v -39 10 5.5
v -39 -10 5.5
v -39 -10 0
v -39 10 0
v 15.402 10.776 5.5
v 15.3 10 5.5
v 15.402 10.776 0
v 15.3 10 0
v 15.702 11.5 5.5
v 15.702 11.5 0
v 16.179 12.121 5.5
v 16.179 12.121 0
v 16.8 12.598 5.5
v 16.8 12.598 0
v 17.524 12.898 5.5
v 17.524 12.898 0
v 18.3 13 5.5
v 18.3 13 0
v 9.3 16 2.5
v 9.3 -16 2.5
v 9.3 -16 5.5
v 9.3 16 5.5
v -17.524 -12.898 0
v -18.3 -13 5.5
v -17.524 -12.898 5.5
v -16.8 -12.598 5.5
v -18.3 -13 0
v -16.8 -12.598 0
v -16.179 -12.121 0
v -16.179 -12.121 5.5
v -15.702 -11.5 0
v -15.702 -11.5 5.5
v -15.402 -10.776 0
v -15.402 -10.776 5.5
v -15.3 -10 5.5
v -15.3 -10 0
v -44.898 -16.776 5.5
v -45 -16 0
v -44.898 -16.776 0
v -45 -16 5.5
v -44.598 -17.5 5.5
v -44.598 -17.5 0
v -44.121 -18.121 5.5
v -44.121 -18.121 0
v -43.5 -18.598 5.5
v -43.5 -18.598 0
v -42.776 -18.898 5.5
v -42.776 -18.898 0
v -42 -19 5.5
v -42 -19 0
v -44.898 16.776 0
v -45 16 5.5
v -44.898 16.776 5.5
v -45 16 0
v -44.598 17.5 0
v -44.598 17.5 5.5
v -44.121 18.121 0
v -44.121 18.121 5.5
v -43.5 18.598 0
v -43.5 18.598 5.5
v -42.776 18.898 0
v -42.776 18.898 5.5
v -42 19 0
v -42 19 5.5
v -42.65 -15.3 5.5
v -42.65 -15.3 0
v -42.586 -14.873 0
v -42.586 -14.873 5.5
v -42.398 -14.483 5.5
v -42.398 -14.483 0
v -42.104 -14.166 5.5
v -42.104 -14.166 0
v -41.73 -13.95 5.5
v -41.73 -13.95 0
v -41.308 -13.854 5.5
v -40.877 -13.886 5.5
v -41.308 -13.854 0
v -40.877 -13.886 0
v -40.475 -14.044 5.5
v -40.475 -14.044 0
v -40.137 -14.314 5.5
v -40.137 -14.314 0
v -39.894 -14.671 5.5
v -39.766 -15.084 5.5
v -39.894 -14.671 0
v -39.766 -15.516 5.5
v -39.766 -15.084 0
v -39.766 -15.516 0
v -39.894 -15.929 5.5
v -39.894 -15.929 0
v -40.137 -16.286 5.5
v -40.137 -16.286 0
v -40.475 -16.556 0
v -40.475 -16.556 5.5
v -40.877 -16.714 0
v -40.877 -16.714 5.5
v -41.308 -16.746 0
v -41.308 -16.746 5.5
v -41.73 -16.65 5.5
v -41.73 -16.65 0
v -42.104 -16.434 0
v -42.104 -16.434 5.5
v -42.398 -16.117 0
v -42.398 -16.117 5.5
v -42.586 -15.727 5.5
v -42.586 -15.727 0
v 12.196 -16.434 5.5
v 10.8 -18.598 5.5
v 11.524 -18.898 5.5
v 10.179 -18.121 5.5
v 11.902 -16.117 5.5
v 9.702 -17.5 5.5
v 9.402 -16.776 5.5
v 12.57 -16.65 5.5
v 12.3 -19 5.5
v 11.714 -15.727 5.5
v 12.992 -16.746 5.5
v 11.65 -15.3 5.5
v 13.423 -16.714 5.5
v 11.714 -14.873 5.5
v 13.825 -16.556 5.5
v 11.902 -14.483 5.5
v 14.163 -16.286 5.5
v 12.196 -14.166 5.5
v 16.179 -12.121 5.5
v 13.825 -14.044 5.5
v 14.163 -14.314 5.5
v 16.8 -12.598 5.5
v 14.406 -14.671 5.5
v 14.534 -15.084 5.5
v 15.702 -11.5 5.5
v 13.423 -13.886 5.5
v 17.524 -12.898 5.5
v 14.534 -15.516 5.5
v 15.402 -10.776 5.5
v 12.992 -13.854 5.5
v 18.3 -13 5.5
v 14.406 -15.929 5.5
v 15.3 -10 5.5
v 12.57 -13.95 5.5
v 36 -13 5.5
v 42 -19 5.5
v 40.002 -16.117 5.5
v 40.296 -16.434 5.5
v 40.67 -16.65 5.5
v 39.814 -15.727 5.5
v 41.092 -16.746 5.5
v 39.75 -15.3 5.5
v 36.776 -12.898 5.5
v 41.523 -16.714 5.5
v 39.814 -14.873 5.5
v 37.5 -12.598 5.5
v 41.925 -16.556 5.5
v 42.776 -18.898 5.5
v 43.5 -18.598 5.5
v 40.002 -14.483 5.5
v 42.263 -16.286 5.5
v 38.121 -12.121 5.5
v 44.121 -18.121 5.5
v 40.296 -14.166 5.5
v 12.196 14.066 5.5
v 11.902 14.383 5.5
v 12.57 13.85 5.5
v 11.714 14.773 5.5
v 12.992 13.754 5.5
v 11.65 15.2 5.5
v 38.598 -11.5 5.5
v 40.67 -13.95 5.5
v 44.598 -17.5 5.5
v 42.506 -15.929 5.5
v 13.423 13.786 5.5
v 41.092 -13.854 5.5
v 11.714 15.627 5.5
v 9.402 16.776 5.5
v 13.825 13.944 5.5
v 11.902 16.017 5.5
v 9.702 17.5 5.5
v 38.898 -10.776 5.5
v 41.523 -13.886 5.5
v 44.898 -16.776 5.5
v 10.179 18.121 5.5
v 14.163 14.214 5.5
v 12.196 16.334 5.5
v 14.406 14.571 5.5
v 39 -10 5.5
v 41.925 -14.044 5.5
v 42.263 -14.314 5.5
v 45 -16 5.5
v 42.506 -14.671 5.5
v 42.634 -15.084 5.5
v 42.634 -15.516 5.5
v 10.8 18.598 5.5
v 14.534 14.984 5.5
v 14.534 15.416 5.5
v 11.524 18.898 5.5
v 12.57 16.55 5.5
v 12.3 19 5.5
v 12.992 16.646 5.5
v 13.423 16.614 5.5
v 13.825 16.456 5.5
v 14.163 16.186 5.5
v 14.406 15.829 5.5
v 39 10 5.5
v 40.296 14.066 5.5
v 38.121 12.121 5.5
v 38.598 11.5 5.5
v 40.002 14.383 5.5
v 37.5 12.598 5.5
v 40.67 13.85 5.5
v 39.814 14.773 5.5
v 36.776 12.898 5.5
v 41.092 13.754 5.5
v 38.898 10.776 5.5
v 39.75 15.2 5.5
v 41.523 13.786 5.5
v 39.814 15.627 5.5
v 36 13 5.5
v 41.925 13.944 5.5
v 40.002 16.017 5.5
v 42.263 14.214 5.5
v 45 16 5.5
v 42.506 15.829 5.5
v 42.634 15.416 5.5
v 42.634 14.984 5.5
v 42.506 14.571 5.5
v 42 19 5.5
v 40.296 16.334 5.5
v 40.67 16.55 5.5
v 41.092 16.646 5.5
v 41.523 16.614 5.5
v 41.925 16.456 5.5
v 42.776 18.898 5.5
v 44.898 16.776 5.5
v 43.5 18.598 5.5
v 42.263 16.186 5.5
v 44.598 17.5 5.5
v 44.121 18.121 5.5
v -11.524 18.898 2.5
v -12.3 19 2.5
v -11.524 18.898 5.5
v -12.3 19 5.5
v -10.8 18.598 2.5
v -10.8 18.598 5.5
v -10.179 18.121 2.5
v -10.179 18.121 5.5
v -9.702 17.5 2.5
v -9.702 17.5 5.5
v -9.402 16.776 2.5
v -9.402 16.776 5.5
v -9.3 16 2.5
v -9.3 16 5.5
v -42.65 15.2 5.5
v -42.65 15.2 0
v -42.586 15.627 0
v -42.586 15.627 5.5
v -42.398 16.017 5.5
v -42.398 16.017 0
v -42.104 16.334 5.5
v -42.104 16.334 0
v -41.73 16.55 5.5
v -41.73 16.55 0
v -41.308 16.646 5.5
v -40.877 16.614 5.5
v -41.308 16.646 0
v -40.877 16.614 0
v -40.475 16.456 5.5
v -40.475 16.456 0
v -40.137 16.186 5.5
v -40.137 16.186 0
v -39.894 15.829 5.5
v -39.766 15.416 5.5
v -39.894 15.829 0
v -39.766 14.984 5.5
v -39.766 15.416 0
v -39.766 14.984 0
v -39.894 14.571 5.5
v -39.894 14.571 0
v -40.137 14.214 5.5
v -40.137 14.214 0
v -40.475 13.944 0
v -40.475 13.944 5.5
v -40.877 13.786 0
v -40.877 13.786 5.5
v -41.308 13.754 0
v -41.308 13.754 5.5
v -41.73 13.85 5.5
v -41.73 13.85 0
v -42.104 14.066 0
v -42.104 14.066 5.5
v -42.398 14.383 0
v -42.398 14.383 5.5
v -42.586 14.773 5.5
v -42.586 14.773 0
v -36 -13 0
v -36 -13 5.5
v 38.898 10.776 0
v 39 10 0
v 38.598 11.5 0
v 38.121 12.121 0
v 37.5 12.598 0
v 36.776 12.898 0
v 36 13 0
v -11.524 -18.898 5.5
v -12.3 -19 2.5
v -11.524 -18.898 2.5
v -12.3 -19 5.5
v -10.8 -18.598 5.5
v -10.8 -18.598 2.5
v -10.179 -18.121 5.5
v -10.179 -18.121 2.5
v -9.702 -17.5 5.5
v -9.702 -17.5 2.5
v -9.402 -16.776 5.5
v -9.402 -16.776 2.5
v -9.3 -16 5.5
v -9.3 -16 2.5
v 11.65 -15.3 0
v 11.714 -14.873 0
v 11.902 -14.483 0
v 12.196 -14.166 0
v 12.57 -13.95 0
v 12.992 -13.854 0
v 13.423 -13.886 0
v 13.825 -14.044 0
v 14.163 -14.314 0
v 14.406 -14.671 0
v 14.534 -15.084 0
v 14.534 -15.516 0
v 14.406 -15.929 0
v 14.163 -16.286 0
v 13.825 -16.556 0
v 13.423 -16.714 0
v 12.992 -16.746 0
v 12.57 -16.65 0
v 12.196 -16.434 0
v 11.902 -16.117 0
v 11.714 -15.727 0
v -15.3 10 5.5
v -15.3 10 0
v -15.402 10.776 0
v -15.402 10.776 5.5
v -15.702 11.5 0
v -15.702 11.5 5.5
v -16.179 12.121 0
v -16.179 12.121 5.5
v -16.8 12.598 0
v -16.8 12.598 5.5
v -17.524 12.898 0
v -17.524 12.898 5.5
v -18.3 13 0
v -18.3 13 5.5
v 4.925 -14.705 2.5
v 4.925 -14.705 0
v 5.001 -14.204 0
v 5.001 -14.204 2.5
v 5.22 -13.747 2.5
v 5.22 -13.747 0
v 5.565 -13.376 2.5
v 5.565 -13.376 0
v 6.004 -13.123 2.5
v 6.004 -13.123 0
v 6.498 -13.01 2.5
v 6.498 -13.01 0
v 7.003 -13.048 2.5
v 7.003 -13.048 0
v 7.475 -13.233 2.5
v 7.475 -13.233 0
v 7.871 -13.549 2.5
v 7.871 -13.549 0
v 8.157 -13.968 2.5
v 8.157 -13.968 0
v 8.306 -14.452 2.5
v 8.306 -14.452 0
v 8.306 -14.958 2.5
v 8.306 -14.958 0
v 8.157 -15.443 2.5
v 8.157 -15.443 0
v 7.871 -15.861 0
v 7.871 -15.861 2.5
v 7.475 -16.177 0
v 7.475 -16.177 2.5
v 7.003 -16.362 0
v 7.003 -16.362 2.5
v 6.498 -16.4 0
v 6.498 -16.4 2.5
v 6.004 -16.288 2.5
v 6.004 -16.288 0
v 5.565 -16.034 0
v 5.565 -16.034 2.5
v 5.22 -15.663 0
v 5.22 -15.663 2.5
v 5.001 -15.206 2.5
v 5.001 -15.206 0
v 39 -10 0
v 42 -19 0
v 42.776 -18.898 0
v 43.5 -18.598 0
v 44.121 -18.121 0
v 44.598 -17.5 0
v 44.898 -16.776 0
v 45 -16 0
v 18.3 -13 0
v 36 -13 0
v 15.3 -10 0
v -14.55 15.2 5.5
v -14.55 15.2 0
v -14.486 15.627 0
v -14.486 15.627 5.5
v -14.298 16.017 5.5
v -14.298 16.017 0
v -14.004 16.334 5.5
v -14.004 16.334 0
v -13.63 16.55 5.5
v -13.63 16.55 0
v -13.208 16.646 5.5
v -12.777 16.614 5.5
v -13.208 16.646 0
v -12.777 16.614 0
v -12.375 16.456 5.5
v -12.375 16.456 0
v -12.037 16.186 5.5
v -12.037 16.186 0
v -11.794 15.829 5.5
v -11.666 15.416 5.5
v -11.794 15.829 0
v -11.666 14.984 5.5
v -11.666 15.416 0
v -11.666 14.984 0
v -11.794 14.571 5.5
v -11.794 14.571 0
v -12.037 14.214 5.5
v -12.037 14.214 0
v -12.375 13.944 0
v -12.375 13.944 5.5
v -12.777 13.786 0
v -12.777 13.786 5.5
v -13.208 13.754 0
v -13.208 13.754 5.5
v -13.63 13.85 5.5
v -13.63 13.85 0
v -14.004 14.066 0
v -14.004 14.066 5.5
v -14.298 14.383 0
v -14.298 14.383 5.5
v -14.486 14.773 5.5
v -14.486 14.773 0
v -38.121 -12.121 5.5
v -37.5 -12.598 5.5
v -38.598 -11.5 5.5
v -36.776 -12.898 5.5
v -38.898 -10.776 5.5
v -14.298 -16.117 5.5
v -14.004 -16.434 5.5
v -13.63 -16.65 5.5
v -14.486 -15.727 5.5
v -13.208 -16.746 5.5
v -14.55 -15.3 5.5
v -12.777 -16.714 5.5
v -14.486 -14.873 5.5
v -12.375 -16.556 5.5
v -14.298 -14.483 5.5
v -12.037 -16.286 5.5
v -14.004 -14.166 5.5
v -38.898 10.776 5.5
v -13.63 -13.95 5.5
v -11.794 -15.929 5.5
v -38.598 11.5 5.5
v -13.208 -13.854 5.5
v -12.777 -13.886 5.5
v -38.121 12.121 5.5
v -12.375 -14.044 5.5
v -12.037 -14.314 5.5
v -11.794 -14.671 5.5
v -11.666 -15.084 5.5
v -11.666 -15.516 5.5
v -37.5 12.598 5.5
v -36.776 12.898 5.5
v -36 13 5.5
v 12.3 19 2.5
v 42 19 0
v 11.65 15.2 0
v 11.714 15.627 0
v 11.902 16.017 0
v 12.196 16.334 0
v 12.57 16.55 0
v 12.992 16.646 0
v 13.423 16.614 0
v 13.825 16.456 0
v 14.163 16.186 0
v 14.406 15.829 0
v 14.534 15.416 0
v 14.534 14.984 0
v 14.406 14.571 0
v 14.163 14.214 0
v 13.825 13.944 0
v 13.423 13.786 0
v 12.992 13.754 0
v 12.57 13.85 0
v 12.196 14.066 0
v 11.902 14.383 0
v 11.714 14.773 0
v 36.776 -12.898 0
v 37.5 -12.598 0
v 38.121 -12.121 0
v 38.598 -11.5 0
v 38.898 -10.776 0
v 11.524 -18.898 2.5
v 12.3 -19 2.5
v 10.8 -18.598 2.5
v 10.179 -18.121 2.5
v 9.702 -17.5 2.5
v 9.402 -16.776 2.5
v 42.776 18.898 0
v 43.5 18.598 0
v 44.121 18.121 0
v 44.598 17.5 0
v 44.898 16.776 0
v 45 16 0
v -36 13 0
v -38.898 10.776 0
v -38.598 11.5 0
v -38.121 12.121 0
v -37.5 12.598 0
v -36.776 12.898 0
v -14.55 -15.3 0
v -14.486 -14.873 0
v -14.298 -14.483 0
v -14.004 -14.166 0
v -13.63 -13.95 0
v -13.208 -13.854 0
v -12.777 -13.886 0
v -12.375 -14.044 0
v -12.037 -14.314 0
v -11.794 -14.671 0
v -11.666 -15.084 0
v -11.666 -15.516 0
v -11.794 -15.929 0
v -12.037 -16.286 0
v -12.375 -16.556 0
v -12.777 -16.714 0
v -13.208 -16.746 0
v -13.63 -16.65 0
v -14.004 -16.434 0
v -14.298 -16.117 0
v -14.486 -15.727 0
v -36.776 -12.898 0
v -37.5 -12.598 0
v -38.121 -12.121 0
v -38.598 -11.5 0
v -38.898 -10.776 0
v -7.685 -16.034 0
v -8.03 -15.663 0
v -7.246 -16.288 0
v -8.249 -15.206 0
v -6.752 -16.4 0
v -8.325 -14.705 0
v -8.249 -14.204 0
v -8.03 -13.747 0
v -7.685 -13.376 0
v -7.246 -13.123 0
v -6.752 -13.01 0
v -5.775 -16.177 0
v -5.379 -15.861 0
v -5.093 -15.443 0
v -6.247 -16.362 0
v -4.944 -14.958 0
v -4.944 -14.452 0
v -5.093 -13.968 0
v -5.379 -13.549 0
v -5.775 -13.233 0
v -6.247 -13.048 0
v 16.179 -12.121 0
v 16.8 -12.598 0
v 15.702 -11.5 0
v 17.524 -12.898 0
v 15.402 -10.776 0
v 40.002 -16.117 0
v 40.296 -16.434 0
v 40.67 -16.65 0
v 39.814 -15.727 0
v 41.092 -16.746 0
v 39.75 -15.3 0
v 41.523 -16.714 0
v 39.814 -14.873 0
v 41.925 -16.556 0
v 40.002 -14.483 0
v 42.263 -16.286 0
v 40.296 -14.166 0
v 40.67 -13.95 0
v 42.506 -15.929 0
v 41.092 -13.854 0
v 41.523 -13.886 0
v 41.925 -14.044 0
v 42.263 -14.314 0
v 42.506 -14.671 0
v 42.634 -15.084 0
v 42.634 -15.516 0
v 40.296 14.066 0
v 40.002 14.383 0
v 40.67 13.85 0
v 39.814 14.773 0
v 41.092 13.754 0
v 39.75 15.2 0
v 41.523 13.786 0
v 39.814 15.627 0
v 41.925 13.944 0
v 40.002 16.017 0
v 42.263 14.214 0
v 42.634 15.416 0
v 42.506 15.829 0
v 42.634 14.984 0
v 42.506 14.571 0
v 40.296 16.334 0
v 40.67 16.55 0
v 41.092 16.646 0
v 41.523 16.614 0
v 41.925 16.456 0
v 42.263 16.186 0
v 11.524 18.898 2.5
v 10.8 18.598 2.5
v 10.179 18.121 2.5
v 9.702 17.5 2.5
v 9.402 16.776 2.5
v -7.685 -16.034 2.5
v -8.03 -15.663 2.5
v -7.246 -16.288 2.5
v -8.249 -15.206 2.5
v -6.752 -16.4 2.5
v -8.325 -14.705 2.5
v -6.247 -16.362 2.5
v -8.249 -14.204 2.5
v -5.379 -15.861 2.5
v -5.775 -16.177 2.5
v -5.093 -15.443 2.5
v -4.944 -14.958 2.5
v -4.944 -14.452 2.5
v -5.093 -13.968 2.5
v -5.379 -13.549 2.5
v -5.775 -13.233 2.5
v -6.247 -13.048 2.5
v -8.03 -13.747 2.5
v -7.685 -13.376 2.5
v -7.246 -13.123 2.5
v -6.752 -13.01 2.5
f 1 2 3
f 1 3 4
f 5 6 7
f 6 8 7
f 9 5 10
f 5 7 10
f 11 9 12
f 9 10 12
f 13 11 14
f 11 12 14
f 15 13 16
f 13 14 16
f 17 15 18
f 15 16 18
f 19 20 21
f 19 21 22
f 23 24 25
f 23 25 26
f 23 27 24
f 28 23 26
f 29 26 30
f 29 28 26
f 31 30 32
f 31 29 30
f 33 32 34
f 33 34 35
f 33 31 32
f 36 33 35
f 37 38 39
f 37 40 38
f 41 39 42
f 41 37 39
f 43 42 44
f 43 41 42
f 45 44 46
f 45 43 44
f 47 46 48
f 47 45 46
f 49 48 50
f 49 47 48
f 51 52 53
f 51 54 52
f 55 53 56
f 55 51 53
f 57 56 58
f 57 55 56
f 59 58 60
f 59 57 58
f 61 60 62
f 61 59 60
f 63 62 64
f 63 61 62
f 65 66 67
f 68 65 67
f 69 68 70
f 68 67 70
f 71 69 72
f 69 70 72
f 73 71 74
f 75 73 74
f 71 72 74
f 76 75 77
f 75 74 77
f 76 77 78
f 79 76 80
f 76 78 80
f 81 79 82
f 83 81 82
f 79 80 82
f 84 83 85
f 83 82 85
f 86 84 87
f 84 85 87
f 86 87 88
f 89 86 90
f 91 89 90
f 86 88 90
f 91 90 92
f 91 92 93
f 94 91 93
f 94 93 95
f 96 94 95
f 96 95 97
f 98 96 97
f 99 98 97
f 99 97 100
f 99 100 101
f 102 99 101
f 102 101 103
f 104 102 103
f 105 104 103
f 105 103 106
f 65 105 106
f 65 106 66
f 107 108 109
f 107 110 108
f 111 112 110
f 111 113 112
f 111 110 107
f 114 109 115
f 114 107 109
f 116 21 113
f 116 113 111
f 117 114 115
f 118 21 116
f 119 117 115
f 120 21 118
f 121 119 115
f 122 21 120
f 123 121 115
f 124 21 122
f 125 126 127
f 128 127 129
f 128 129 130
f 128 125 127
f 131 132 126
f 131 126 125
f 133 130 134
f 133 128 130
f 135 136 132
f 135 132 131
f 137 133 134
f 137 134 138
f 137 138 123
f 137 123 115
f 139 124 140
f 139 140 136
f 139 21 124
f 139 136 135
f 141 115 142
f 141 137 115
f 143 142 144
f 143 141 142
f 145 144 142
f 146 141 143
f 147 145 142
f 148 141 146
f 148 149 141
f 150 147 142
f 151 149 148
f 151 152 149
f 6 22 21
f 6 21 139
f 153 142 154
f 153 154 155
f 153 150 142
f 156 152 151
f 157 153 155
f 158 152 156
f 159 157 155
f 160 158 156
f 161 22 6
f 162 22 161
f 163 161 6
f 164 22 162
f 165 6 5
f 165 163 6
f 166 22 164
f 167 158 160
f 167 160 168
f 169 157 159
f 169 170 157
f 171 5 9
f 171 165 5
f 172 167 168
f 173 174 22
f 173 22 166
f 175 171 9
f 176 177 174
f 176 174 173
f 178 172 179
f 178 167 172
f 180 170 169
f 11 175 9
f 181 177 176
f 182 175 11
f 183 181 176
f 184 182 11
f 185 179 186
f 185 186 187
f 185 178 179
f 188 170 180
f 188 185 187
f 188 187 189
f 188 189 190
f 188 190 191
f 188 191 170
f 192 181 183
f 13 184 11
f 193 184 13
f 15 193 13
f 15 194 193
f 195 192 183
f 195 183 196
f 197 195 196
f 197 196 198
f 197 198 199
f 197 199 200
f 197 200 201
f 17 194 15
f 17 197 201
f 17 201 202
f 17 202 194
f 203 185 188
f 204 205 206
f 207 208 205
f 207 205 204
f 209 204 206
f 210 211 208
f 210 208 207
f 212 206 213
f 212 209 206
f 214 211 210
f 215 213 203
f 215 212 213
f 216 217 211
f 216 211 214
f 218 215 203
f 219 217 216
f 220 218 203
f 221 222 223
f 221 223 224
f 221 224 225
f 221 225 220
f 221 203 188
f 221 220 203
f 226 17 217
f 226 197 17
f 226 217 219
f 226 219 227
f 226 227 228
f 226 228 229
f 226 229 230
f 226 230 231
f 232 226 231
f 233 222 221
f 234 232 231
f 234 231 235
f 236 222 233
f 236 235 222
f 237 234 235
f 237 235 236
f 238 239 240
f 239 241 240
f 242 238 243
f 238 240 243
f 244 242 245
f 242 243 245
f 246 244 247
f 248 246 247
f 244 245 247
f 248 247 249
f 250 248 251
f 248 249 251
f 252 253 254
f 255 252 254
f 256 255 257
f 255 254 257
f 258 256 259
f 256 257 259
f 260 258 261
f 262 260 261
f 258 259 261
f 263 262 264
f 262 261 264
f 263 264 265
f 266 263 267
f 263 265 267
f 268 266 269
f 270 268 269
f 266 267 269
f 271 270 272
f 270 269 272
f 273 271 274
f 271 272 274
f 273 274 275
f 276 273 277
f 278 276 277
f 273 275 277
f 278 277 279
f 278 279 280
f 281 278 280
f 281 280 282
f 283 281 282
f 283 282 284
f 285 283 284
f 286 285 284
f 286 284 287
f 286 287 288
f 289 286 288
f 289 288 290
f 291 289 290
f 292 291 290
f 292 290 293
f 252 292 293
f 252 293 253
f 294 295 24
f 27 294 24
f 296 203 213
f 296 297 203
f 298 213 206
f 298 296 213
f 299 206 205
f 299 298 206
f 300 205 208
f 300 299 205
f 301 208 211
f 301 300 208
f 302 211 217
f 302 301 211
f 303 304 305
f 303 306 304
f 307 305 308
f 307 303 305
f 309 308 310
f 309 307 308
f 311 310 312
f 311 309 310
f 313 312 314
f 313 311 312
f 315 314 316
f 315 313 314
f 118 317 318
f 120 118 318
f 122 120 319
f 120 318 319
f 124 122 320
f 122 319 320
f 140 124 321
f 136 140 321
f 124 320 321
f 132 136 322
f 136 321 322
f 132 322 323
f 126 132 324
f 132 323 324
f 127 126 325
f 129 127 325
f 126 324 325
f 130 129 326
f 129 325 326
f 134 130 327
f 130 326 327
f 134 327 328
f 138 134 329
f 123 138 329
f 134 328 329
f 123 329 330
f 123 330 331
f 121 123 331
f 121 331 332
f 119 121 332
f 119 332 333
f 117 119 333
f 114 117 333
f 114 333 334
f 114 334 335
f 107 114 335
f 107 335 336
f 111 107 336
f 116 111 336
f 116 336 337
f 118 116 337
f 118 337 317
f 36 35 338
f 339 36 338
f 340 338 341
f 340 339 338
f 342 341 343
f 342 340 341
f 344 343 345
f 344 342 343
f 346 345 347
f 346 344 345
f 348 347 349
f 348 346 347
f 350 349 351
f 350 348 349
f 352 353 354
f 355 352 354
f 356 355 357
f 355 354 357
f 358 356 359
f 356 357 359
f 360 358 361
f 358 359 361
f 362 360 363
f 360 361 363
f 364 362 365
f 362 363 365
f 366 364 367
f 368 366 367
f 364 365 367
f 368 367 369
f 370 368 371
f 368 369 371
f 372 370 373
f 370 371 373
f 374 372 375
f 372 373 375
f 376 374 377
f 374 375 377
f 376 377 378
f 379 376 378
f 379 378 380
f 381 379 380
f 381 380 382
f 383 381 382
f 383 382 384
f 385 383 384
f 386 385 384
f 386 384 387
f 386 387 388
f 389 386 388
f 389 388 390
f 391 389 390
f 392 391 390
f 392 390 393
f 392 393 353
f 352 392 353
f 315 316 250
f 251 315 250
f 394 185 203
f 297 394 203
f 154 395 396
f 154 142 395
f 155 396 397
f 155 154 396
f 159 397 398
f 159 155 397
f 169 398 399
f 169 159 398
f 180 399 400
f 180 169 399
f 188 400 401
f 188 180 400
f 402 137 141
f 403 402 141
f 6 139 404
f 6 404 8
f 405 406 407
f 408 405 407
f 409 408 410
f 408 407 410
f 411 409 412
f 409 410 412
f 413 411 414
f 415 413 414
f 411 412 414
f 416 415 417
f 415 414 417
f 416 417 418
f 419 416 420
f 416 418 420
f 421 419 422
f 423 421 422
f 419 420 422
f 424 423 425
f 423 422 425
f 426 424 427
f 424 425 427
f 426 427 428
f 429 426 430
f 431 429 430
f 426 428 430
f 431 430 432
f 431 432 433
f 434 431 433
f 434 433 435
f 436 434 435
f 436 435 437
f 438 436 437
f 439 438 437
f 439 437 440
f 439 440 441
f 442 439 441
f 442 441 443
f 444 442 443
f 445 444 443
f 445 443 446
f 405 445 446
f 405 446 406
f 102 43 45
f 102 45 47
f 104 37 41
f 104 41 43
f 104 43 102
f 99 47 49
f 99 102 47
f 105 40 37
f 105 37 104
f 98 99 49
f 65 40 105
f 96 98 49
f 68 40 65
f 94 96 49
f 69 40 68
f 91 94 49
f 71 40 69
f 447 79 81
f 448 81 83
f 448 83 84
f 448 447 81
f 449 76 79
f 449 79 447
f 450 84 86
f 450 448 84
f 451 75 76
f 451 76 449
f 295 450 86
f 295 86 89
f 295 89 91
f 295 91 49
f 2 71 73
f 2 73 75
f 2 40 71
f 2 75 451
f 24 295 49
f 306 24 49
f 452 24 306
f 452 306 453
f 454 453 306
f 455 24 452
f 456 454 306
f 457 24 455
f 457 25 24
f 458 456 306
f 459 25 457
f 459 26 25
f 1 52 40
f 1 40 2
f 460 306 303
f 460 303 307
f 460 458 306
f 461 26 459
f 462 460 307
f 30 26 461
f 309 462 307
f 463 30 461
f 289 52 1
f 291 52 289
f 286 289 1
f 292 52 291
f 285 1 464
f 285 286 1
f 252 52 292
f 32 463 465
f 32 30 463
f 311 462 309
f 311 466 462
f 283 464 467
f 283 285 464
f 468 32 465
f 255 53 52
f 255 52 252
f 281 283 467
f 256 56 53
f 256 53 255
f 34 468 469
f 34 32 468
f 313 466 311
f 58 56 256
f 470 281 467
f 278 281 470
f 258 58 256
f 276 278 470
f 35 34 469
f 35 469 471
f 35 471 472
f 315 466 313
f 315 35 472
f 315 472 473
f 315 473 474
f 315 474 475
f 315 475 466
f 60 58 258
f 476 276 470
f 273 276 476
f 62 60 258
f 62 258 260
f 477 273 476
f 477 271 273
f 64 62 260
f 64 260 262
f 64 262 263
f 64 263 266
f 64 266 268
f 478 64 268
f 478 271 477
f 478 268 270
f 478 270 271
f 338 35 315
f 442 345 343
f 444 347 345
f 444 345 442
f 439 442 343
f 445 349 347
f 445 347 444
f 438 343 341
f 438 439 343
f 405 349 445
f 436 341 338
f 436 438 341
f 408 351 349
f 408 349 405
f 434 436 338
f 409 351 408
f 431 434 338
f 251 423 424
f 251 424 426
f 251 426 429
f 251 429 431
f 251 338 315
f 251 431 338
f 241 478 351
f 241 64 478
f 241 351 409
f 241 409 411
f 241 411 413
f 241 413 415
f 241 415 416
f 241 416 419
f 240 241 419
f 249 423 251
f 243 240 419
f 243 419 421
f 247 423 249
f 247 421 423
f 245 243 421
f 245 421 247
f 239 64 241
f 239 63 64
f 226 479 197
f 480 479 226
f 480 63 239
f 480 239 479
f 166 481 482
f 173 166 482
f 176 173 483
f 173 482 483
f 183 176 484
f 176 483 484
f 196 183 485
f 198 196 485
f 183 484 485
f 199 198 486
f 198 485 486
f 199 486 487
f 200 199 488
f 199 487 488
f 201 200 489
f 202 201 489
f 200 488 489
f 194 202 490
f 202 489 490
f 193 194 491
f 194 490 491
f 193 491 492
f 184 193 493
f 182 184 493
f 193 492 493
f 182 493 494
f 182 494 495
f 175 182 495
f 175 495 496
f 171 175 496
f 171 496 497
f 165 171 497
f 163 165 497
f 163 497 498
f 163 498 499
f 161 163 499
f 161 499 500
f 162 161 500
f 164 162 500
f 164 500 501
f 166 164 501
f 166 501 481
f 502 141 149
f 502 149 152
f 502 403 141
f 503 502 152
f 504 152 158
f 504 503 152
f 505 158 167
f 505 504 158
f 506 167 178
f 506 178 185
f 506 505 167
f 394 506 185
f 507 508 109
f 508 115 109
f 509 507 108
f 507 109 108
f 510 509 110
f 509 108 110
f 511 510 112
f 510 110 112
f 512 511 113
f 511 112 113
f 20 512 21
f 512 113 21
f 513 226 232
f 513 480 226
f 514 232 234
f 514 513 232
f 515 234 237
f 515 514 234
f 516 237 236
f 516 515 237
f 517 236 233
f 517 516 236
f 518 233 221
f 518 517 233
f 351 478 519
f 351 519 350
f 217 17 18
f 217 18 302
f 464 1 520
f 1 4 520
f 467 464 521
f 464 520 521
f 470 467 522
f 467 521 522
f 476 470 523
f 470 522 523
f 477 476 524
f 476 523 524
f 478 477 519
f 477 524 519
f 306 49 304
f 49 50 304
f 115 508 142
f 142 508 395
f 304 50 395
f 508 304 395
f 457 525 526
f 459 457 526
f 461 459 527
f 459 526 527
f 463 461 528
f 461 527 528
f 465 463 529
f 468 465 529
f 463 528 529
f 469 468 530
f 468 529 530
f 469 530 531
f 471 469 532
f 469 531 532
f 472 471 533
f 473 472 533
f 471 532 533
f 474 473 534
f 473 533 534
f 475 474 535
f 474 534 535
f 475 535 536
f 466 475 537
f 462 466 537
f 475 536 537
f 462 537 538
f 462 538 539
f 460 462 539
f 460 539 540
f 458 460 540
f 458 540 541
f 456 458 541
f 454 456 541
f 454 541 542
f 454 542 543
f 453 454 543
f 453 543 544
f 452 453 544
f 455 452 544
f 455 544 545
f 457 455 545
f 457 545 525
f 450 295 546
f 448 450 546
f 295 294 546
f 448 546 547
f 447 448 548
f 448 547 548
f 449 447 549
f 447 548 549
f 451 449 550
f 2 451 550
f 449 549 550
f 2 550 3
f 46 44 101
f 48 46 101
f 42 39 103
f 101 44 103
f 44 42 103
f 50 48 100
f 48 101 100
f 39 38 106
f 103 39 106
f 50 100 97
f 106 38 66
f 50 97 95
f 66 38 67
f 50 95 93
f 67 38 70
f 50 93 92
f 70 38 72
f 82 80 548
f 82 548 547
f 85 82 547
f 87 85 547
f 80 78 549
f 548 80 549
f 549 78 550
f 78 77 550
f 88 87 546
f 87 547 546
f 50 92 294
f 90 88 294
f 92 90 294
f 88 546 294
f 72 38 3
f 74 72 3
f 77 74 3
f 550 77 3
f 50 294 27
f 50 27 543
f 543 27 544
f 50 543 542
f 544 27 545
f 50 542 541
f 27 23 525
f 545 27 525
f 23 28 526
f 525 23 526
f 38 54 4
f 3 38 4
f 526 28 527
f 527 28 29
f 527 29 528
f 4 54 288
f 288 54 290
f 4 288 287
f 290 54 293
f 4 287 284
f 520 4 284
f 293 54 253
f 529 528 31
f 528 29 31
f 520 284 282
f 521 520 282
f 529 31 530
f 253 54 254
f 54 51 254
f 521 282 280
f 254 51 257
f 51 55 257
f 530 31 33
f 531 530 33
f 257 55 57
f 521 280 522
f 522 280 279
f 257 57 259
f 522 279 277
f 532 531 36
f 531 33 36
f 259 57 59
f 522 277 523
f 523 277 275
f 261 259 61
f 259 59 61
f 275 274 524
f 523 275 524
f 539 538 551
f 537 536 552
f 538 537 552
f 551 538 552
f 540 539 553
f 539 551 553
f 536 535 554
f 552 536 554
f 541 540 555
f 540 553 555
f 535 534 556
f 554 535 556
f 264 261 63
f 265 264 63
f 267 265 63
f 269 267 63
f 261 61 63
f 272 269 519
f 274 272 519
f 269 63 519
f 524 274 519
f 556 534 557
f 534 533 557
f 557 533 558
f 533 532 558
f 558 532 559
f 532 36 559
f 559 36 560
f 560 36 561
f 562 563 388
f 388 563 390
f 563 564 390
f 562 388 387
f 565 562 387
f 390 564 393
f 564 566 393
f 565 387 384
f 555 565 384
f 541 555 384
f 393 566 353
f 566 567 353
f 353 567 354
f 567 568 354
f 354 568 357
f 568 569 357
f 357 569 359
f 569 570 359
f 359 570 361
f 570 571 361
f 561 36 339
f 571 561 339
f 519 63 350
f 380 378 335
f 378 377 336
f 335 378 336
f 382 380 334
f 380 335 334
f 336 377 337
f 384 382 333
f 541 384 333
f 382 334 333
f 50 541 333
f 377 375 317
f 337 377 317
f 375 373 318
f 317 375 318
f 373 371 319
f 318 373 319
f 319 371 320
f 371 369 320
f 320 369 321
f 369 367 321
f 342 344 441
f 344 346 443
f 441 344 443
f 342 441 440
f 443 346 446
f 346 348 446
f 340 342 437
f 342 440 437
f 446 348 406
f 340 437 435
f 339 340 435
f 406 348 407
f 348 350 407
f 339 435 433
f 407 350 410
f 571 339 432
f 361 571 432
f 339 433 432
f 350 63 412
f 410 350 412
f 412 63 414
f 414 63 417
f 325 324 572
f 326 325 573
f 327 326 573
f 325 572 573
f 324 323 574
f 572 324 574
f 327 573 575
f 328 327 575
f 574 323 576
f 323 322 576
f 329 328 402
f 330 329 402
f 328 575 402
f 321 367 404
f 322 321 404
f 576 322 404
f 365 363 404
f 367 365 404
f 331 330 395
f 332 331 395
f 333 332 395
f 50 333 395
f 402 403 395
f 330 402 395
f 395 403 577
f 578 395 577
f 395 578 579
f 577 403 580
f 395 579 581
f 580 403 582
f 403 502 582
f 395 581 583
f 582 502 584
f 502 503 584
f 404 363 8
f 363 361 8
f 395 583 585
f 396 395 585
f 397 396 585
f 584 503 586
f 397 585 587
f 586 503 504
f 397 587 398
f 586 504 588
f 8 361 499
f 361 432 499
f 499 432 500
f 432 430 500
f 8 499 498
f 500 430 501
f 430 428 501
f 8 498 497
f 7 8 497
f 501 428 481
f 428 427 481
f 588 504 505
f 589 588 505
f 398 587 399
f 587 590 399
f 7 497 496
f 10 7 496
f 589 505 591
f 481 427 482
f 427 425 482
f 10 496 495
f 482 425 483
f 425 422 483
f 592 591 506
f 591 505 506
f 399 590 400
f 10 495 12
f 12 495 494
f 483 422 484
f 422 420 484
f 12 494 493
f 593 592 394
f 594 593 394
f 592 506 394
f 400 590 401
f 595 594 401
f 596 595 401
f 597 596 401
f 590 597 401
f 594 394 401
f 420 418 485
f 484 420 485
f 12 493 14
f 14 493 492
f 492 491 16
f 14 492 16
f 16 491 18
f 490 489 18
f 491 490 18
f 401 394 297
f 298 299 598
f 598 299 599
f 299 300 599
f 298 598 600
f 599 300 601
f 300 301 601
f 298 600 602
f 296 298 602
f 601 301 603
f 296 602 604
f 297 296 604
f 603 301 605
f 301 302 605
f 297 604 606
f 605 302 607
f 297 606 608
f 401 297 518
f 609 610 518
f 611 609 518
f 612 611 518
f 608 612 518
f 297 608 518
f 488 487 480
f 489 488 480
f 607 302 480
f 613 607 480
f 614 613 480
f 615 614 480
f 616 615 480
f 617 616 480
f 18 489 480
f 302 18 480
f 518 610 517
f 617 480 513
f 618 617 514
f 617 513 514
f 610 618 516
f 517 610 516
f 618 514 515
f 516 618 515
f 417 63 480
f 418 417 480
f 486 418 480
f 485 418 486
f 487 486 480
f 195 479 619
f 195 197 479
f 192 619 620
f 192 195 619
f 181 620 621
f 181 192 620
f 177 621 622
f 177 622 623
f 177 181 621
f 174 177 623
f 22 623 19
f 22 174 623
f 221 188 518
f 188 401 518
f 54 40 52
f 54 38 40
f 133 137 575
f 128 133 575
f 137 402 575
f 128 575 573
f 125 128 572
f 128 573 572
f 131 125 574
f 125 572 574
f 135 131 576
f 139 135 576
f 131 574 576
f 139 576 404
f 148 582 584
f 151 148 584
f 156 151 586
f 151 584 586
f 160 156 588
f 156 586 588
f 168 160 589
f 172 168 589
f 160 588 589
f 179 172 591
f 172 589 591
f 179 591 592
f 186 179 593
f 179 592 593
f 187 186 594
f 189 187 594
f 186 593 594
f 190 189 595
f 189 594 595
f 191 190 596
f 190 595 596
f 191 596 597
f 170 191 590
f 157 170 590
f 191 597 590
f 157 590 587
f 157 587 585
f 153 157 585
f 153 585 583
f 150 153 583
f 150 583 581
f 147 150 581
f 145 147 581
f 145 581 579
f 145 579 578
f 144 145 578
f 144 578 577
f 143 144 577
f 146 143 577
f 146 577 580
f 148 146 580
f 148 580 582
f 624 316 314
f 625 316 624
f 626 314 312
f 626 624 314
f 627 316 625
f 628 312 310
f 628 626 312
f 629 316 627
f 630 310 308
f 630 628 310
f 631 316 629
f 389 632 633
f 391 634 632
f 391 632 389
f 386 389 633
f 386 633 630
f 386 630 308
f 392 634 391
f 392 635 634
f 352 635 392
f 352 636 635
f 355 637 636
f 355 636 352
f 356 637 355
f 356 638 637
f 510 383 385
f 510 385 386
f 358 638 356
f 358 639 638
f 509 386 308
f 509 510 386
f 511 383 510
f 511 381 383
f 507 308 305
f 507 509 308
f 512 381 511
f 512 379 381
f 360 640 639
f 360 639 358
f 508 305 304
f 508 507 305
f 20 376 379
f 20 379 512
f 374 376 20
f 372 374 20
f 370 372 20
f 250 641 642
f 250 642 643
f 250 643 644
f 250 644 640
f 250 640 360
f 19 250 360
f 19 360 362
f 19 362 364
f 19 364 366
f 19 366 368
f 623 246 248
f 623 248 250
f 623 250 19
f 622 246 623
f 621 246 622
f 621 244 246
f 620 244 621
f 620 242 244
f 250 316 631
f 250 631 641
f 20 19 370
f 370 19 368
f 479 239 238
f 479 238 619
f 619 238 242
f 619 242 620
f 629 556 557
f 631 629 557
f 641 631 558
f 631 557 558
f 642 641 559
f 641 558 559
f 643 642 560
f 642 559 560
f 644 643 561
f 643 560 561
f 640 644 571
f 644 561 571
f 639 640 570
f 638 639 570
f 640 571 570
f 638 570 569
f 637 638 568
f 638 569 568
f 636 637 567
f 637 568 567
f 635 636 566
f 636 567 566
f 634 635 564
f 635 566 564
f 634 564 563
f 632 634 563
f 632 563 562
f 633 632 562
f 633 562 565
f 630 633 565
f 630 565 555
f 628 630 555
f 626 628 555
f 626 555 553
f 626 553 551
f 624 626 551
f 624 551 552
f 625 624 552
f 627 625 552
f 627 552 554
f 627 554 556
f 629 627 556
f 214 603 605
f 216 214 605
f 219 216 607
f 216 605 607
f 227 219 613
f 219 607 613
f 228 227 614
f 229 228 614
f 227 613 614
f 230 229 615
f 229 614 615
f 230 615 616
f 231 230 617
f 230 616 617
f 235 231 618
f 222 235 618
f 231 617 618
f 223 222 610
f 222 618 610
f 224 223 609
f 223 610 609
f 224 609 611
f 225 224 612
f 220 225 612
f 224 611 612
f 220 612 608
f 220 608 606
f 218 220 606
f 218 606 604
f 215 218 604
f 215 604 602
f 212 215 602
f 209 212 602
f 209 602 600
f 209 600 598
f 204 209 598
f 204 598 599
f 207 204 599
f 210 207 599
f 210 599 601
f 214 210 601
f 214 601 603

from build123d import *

# Parameters (mm, degrees)
F0_W        = 90
F0_H        = 38
F1_DEPTH    = 2.5
F3_D        = 3.4
F2_W        = 35.7
F2_H        = 38
F4_DEPTH    = 3
F6_W        = 23.7
F6_H        = 26
F5_W        = 23.7
F5_H        = 26
F7_DEPTH    = 10
F10_D       = 2.9
F10_ON_F9_D = 2.9
F11_R       = 3


with BuildPart() as f1:
    # F0 (on Top) → F1 (new body)
    with BuildSketch(Plane.XY):
        Rectangle(F0_W, F0_H)
    extrude(amount=F1_DEPTH)

    # F3 (through all)
    with Locations(Plane.XY.offset(2.5)):
        with Locations((6.625, -14.7051038221), (-6.625, -14.7051038221)):
            Hole(F3_D / 2)

    # F2 (on face) → F4 (join)
    with BuildSketch(Plane.XY.offset(2.5)):
        with Locations((-27.15, 0)):
            Rectangle(F2_W, F2_H)
        with Locations((27.15, 0)):
            Rectangle(F2_W, F2_H)
    extrude(amount=F4_DEPTH)

    # F6 (on face) + F5 (on face) → F7 (cut)
    with BuildSketch(Plane.XY.offset(5.5)):
        with Locations((-27.15, 0)):
            Rectangle(F6_W, F6_H)
    with BuildSketch(Plane.XY.offset(5.5)):
        with Locations((27.15, 0)):
            Rectangle(F5_W, F5_H)
    extrude(amount=-F7_DEPTH, mode=Mode.SUBTRACT)

    # F10 (through all)
    with Locations(Plane.XY.offset(5.5)):
        with Locations((-41.2, 15.2), (-41.2, -15.3), (-13.1, 15.2), (-13.1, -15.3)):
            Hole(F10_D / 2)

    # F10 on F9 (through all)
    with Locations(Plane.XY.offset(5.5)):
        with Locations((13.1, 15.2), (41.2, 15.2), (13.1, -15.3), (41.2, -15.3)):
            Hole(F10_ON_F9_D / 2)

    # F11
    f11_edges = [f1.edges().sort_by_distance(p)[0] for p in [
        (-45, 19, 2.75),
        (9.3, 19, 4),
        (45, 19, 2.75),
        (39, -13, 2.75),
        (-15.3, -13, 2.75),
        (-45, -19, 2.75),
        (-9.3, -19, 4),
        (-39, 13, 2.75),
        (-9.3, 19, 4),
        (15.3, 13, 2.75),
        (45, -19, 2.75),
        (15.3, -13, 2.75),
        (-39, -13, 2.75),
        (-15.3, 13, 2.75),
        (39, 13, 2.75),
        (9.3, -19, 4),
    ]]
    fillet(f11_edges, radius=F11_R)


solid = f1.part
